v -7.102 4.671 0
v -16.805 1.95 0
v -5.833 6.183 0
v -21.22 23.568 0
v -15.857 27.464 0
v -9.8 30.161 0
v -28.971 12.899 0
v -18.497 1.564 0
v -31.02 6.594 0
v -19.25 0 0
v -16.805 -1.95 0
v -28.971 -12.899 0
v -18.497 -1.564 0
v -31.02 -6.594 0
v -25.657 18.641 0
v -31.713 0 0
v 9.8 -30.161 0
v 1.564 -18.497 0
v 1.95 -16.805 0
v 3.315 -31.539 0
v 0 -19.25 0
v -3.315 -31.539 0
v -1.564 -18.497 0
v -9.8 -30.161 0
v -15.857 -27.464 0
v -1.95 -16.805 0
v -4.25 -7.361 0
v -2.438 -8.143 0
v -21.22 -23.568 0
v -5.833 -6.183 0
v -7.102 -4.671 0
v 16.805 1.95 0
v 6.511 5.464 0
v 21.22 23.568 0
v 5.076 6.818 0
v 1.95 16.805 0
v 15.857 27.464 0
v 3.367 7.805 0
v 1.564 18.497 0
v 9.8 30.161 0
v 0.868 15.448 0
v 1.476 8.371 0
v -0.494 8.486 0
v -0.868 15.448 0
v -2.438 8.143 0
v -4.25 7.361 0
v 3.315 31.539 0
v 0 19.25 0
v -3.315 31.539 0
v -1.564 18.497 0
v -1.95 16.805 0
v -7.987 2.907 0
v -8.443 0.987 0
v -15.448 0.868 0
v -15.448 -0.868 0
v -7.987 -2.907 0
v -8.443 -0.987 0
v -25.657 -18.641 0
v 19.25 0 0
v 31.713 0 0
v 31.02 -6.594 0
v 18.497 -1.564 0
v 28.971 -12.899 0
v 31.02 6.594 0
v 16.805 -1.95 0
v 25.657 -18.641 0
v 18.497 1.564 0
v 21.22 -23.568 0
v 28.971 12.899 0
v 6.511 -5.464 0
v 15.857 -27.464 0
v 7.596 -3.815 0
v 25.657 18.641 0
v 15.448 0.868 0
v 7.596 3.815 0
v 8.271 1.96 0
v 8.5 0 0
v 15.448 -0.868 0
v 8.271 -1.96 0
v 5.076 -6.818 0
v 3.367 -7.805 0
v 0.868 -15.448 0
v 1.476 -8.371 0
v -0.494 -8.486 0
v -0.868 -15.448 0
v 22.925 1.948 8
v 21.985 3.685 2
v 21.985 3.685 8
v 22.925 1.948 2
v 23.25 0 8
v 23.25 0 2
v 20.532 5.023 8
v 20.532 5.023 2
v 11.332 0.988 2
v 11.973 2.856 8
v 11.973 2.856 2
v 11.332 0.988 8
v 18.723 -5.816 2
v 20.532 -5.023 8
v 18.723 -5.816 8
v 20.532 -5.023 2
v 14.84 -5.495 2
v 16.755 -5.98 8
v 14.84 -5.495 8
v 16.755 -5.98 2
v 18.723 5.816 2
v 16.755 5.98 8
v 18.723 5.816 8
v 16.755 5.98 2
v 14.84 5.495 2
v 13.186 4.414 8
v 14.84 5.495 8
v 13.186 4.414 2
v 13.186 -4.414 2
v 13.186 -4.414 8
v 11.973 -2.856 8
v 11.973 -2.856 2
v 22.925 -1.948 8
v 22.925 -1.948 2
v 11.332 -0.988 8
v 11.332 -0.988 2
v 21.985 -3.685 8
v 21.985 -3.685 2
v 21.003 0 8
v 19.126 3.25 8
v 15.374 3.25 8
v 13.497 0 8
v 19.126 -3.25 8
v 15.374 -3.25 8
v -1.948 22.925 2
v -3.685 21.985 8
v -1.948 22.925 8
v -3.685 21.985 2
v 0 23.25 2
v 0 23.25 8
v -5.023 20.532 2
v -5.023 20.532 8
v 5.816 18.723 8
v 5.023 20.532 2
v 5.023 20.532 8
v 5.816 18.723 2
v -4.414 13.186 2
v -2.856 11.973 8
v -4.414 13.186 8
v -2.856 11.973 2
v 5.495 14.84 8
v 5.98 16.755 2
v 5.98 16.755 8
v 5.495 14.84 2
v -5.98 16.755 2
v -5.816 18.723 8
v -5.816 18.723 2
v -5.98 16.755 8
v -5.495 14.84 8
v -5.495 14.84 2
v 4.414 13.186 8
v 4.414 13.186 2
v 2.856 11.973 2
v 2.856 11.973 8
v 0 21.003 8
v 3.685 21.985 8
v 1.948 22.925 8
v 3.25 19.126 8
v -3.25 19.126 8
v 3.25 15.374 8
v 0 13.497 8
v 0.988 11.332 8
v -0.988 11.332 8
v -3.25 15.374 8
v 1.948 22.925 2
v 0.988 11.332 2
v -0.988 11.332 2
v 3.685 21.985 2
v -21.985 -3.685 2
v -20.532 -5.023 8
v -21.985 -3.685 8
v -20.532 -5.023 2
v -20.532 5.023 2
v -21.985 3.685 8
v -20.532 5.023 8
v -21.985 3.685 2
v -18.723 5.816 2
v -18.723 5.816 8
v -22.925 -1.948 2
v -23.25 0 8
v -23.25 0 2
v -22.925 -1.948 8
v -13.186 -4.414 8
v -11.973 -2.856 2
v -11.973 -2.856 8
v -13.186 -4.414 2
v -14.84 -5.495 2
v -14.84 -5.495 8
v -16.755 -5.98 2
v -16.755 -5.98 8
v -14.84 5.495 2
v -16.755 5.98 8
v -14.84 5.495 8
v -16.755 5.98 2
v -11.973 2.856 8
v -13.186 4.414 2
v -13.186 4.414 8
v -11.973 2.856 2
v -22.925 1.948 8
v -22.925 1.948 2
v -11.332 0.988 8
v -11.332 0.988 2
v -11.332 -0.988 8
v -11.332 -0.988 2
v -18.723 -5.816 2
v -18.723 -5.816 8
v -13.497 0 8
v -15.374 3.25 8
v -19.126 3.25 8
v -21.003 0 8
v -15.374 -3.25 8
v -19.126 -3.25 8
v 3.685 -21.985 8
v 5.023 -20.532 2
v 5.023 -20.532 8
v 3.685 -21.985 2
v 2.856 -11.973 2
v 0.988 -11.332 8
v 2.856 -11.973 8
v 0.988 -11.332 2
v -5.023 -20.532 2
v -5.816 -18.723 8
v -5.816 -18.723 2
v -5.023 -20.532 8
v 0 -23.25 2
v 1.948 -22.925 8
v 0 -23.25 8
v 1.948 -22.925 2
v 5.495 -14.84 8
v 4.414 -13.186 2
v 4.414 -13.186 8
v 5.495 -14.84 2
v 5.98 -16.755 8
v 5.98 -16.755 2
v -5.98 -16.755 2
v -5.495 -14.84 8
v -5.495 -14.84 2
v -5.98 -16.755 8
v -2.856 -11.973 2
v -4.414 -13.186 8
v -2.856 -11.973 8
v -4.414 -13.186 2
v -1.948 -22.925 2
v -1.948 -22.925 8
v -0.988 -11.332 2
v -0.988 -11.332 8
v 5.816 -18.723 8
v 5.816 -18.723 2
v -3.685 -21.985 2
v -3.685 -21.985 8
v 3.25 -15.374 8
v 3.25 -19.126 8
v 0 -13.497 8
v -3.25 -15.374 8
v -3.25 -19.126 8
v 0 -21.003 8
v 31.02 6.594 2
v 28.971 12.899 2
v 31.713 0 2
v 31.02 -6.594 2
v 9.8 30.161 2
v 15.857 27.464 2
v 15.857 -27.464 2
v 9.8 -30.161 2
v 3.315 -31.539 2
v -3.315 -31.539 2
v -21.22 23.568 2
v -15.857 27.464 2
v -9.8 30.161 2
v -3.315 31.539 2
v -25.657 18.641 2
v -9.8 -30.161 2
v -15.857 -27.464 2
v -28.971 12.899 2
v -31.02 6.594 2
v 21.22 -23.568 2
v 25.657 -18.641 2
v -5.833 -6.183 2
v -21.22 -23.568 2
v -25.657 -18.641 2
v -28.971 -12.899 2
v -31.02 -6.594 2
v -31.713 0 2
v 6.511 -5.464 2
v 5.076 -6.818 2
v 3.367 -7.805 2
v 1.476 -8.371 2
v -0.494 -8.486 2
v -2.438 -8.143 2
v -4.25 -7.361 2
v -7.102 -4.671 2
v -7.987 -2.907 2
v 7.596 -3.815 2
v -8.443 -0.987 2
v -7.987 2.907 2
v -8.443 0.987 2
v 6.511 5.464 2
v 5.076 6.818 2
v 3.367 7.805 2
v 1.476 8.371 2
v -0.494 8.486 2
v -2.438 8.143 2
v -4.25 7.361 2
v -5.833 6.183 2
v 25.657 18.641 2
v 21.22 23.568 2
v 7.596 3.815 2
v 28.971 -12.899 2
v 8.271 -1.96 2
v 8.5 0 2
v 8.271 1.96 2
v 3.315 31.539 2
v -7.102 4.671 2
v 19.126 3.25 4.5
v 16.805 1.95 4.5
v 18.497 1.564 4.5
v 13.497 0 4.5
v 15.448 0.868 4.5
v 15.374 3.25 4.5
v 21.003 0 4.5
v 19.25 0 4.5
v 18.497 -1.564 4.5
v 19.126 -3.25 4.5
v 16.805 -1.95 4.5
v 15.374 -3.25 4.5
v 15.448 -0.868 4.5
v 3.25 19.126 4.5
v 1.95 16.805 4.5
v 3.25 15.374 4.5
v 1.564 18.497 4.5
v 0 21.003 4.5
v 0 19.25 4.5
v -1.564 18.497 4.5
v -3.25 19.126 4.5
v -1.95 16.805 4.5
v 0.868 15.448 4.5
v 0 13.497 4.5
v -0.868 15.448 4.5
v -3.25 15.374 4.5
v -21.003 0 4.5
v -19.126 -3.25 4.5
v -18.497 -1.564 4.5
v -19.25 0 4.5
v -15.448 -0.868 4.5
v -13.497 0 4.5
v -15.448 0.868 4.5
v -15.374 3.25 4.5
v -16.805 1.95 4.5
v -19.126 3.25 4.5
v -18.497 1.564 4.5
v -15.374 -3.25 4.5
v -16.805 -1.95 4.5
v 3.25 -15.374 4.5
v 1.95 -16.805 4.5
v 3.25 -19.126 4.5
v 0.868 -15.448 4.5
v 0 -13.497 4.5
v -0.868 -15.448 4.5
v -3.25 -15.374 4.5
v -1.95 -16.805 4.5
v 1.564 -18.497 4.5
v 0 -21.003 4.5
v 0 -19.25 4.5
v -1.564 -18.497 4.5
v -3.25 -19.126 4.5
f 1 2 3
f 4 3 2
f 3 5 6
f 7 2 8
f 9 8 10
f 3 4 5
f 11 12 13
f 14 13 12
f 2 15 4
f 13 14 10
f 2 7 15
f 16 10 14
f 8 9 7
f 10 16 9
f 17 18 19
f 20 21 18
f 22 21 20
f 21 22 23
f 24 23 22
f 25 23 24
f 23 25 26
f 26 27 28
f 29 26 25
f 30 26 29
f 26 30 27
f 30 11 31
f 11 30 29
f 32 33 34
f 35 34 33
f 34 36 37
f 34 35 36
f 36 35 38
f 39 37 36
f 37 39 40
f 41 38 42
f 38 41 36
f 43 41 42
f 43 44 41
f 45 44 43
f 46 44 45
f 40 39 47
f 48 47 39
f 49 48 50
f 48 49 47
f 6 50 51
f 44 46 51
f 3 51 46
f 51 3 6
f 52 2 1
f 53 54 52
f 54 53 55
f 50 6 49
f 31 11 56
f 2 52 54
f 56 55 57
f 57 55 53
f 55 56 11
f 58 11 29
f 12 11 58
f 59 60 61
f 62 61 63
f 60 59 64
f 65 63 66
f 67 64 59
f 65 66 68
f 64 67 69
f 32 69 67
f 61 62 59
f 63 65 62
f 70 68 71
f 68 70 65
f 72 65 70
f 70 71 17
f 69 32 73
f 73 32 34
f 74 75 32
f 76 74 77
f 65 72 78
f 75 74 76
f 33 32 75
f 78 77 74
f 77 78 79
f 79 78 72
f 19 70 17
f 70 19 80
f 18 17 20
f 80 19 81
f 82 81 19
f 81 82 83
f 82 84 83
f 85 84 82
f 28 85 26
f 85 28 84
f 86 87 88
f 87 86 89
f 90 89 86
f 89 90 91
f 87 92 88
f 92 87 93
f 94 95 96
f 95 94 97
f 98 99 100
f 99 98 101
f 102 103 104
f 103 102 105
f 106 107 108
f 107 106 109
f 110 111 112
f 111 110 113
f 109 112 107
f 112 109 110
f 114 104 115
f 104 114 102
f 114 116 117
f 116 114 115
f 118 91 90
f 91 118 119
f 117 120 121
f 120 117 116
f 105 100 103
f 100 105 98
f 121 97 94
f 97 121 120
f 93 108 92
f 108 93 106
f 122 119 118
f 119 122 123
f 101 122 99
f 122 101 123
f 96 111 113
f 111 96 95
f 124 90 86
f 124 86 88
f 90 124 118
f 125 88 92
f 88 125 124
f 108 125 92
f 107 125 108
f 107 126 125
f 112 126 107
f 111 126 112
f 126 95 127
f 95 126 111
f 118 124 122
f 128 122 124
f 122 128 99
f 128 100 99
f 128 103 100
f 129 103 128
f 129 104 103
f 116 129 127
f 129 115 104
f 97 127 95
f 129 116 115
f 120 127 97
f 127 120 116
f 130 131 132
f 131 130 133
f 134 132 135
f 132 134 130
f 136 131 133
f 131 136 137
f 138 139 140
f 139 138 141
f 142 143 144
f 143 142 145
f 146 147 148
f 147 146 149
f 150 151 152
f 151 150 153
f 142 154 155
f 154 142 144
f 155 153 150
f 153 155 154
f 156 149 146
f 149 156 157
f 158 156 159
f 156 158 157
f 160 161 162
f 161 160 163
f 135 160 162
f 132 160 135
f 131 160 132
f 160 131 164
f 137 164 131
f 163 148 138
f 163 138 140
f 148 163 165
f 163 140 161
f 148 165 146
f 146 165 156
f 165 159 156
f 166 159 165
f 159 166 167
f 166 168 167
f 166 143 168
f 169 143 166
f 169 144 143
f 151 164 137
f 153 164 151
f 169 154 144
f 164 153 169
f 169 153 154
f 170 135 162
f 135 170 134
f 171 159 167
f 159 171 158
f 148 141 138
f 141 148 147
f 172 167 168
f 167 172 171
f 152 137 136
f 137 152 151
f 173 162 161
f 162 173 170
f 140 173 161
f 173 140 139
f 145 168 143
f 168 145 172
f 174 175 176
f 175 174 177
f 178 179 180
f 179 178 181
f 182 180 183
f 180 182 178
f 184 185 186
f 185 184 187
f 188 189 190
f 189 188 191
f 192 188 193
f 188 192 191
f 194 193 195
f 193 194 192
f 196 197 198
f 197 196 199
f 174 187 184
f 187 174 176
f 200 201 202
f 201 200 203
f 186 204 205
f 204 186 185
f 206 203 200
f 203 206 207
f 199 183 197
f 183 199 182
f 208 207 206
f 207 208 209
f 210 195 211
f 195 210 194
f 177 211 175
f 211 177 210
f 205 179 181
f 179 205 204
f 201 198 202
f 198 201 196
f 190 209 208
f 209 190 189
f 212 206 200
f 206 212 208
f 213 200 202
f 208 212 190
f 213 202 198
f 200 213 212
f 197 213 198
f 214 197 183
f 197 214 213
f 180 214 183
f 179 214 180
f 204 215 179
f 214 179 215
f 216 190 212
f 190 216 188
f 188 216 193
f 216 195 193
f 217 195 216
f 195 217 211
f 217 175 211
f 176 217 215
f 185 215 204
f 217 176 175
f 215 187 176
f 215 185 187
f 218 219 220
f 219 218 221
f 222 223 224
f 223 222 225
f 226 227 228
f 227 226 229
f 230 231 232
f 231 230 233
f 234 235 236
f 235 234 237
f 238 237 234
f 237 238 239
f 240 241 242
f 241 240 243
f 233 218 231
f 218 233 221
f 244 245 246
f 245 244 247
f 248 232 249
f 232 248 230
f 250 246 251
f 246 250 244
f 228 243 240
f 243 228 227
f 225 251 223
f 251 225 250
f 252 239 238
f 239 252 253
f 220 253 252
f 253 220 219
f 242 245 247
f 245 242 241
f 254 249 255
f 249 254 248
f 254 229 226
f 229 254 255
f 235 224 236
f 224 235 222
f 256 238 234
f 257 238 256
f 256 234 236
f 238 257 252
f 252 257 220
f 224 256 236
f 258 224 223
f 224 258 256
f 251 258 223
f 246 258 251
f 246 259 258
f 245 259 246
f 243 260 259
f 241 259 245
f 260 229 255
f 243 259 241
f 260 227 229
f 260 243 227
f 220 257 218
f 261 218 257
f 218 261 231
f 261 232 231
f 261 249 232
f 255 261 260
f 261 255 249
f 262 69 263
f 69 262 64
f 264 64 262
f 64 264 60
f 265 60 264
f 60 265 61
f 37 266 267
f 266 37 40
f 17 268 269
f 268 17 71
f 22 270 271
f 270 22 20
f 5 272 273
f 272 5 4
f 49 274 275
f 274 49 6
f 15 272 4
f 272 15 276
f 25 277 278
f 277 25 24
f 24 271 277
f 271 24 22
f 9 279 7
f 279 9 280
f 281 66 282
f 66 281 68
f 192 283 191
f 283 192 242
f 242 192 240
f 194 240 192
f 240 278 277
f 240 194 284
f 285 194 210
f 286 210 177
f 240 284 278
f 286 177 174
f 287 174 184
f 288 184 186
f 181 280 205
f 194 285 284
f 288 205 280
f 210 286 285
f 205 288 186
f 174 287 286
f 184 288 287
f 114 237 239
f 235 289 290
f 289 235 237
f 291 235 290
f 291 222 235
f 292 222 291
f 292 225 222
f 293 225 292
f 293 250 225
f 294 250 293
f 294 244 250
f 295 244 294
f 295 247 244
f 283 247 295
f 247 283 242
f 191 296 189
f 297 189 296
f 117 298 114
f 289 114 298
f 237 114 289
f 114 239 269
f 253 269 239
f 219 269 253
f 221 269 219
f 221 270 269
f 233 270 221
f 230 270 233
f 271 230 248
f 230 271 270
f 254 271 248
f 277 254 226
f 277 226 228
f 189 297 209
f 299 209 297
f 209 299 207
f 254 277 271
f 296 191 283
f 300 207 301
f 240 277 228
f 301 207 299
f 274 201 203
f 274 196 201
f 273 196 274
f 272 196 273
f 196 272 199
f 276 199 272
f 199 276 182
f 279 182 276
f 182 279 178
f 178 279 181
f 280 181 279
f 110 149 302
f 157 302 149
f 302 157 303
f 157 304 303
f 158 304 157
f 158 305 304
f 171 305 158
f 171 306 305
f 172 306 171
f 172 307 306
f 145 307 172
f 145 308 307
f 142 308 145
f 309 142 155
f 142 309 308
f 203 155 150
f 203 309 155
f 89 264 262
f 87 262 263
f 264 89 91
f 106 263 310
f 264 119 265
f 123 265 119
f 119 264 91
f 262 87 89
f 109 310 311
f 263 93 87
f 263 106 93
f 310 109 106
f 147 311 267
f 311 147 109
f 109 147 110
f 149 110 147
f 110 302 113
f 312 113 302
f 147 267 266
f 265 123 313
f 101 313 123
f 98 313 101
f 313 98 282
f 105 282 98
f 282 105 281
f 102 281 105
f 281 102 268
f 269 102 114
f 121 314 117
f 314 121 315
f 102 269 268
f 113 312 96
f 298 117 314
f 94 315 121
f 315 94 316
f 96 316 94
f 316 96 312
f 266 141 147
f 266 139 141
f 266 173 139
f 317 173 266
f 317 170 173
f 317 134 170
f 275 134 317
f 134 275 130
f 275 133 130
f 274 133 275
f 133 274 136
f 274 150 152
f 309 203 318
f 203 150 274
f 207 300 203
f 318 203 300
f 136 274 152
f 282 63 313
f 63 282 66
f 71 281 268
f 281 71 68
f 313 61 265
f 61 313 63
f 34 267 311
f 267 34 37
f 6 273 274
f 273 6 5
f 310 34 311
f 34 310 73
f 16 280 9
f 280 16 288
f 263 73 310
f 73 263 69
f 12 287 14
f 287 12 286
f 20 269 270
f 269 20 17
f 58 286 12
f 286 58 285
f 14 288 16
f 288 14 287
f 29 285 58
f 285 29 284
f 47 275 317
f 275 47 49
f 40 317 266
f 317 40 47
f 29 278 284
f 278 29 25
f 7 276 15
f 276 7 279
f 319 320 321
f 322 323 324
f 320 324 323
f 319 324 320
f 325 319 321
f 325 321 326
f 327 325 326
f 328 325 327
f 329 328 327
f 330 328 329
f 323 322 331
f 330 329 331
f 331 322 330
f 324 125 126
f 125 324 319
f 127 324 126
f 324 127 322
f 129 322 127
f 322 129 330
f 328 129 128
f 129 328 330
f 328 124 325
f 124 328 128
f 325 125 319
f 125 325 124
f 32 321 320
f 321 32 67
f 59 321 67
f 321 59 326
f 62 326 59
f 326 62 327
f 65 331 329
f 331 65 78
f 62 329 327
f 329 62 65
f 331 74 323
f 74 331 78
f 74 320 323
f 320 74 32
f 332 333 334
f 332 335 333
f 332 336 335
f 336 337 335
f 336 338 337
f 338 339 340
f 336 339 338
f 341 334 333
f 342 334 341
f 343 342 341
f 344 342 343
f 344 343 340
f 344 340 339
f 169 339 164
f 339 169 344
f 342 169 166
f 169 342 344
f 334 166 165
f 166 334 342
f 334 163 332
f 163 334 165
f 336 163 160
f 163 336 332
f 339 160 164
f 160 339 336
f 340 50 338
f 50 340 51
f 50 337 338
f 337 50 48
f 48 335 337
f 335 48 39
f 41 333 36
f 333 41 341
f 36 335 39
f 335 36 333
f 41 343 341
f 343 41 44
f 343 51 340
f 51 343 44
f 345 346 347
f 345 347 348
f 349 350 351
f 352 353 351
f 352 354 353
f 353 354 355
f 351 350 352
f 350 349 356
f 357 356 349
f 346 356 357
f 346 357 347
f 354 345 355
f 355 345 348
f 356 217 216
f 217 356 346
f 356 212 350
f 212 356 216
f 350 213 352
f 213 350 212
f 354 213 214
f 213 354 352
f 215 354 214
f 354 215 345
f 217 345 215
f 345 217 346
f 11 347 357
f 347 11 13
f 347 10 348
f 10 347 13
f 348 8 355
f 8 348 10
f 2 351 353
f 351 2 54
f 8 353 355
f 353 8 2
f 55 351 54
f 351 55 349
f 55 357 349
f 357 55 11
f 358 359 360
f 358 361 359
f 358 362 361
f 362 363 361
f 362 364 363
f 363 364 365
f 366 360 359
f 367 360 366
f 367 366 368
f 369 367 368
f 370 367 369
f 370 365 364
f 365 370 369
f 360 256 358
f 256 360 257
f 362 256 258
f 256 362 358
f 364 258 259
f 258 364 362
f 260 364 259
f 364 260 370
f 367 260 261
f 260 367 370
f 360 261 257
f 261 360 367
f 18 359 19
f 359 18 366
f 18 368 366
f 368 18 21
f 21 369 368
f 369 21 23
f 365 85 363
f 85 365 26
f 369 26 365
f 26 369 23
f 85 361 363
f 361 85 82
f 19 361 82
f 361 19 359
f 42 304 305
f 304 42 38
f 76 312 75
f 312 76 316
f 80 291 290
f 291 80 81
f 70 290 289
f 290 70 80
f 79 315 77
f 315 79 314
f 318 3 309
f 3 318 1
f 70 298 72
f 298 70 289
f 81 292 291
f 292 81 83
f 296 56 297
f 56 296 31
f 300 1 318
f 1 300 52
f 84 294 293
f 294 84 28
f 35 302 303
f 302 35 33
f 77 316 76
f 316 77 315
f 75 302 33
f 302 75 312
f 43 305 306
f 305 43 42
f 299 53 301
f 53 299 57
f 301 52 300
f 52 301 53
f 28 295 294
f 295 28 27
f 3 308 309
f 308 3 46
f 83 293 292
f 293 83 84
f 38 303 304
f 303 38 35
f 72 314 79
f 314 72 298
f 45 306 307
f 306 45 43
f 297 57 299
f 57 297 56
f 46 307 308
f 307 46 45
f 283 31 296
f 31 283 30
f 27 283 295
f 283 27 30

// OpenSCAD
module hexnut(flats=10, depth=5){
	sliceangle = 360 / 6;
	pointradius = flats / (2 * cos(sliceangle/2));
	flatoffset = flats * tan(sliceangle/2) / 2;
	union(){
		for(angle=[0:sliceangle:360]) {
			rotate(angle,[0,0,1]) linear_extrude(height=depth) polygon(points=[[0,-1],[flatoffset,flats/2],[-flatoffset,flats/2]],paths=[[0,1,2]]);
		}
	}
}

module idlercover(face=30, cutout=8, height=2){
	width = face+(2*sqrt((face*face)/2));
	difference() {
		union() {
			cylinder(r=(width/2)-((cutout/2))-0.5,h=height);	
			for(nutangle=[0:90:360]) {
				rotate(nutangle,[0,0,1]) translate([24.5/2+5,0,0]) {
					cylinder(r=6,h=8);
				}
			}
		}	
		cylinder(r=8.5,h=height);
		for(nutangle=[0:90:360]) {
			rotate(nutangle,[0,0,1]) translate([24.5/2+5,0,0]) {
				translate([0,0,4.5]) hexnut(flats=6.5,h=3.5);
				cylinder(r=2,h=8.5);
			}
		}
	}
}


idlercover(face=30);
